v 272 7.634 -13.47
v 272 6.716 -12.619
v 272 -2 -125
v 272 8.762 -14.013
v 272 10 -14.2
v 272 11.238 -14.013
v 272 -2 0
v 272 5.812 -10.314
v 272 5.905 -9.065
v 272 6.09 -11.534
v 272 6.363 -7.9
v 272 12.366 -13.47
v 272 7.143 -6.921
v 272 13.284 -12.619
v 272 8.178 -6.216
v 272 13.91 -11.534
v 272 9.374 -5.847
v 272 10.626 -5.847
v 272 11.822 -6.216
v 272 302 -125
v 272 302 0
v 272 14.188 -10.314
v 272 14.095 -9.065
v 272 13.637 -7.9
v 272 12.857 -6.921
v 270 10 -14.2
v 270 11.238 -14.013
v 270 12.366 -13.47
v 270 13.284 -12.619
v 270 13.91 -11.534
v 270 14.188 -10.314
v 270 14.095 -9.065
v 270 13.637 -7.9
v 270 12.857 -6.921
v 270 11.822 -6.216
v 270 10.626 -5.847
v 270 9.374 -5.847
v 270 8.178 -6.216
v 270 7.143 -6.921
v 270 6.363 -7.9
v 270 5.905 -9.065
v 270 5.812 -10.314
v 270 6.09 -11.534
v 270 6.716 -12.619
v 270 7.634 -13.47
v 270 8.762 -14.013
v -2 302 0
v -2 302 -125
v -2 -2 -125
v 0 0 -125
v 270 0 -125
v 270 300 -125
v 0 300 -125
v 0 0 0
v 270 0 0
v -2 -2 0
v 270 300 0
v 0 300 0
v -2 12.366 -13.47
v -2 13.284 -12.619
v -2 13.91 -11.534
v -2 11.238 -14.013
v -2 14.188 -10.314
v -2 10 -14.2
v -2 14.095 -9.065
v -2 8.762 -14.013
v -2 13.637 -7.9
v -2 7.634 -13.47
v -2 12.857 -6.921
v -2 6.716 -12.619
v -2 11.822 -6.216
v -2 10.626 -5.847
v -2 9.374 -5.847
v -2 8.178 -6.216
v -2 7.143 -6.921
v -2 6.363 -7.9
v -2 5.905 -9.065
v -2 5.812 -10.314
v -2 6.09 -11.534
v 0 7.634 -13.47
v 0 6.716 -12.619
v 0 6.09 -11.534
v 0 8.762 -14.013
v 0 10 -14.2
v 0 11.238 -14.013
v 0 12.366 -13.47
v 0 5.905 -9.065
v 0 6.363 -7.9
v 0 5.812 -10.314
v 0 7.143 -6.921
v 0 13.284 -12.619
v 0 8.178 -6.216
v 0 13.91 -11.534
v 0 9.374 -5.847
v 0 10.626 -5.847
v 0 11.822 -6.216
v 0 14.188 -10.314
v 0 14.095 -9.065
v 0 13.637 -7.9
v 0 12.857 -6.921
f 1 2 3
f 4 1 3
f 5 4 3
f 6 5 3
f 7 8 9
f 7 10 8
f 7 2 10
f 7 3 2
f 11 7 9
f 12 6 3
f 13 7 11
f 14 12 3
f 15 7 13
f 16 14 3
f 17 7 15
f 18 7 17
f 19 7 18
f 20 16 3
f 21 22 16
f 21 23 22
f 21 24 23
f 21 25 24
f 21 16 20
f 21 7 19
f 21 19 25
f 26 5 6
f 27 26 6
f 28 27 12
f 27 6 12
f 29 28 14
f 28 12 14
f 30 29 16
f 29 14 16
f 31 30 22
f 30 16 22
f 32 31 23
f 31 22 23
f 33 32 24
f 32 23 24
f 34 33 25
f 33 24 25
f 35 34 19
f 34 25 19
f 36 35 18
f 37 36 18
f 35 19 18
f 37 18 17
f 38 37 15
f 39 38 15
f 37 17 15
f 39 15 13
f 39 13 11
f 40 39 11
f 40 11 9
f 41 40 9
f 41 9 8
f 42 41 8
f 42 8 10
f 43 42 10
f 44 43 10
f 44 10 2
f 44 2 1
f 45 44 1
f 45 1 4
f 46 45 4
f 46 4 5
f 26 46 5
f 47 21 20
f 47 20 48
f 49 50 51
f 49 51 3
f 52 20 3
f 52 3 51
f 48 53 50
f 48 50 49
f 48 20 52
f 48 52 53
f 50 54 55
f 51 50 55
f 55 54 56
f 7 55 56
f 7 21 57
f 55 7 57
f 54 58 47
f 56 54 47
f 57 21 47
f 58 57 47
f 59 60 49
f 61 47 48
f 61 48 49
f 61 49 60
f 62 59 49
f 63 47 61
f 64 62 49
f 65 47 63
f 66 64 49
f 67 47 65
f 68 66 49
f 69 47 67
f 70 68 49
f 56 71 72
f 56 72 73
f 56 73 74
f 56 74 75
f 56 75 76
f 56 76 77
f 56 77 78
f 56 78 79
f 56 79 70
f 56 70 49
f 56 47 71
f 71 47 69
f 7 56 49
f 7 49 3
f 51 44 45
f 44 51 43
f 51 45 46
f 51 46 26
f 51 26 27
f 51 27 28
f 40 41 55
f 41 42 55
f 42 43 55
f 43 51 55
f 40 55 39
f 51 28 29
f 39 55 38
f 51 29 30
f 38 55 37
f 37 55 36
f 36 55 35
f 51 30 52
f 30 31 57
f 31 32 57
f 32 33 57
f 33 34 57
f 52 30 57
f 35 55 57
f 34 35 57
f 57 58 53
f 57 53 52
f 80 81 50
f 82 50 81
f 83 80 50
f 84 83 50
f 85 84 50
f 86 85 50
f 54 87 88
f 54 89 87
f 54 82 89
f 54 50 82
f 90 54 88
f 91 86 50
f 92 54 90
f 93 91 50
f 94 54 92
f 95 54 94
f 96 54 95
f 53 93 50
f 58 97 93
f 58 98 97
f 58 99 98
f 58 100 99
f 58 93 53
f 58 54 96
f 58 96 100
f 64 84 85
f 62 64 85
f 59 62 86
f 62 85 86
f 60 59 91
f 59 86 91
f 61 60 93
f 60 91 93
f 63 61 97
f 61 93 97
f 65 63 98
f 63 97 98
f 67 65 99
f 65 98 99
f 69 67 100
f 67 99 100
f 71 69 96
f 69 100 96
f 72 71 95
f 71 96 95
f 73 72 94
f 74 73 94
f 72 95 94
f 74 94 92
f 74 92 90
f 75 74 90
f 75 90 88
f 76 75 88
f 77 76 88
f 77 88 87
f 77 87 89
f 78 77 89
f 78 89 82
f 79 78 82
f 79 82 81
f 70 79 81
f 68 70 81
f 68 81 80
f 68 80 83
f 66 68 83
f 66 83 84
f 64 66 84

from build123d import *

# Parameters (mm, degrees)
SKETCH1_W           = 270
SKETCH1_H           = 300
BOSS_EXTRUDE1_DEPTH = 125
SKETCH5_R           = 4.2
CUT_EXTRUDE1_DEPTH  = 299


with BuildPart() as part:
    # Sketch1 → Boss-Extrude1 (new body)
    with BuildSketch(Plane.XY):
        Polygon((270, 302), (272, 302), (272, 300), (272, 0), (272, -2), (270, -2), (0, -2), (-2, -2), (-2, 0), (-2, 300), (-2, 302), (0, 302), align=None)
        with Locations((135, 150)):
            Rectangle(SKETCH1_W, SKETCH1_H, mode=Mode.SUBTRACT)
    extrude(amount=-BOSS_EXTRUDE1_DEPTH)

    # Sketch5 → Cut-Extrude1 (cut)
    with BuildSketch(Plane(origin=(272, 0, 0), x_dir=(0, 0, -1), z_dir=(1, 0, 0))):
        with Locations((10, 10)):
            Circle(SKETCH5_R)
    extrude(amount=-CUT_EXTRUDE1_DEPTH, mode=Mode.SUBTRACT)


solid = part.part
